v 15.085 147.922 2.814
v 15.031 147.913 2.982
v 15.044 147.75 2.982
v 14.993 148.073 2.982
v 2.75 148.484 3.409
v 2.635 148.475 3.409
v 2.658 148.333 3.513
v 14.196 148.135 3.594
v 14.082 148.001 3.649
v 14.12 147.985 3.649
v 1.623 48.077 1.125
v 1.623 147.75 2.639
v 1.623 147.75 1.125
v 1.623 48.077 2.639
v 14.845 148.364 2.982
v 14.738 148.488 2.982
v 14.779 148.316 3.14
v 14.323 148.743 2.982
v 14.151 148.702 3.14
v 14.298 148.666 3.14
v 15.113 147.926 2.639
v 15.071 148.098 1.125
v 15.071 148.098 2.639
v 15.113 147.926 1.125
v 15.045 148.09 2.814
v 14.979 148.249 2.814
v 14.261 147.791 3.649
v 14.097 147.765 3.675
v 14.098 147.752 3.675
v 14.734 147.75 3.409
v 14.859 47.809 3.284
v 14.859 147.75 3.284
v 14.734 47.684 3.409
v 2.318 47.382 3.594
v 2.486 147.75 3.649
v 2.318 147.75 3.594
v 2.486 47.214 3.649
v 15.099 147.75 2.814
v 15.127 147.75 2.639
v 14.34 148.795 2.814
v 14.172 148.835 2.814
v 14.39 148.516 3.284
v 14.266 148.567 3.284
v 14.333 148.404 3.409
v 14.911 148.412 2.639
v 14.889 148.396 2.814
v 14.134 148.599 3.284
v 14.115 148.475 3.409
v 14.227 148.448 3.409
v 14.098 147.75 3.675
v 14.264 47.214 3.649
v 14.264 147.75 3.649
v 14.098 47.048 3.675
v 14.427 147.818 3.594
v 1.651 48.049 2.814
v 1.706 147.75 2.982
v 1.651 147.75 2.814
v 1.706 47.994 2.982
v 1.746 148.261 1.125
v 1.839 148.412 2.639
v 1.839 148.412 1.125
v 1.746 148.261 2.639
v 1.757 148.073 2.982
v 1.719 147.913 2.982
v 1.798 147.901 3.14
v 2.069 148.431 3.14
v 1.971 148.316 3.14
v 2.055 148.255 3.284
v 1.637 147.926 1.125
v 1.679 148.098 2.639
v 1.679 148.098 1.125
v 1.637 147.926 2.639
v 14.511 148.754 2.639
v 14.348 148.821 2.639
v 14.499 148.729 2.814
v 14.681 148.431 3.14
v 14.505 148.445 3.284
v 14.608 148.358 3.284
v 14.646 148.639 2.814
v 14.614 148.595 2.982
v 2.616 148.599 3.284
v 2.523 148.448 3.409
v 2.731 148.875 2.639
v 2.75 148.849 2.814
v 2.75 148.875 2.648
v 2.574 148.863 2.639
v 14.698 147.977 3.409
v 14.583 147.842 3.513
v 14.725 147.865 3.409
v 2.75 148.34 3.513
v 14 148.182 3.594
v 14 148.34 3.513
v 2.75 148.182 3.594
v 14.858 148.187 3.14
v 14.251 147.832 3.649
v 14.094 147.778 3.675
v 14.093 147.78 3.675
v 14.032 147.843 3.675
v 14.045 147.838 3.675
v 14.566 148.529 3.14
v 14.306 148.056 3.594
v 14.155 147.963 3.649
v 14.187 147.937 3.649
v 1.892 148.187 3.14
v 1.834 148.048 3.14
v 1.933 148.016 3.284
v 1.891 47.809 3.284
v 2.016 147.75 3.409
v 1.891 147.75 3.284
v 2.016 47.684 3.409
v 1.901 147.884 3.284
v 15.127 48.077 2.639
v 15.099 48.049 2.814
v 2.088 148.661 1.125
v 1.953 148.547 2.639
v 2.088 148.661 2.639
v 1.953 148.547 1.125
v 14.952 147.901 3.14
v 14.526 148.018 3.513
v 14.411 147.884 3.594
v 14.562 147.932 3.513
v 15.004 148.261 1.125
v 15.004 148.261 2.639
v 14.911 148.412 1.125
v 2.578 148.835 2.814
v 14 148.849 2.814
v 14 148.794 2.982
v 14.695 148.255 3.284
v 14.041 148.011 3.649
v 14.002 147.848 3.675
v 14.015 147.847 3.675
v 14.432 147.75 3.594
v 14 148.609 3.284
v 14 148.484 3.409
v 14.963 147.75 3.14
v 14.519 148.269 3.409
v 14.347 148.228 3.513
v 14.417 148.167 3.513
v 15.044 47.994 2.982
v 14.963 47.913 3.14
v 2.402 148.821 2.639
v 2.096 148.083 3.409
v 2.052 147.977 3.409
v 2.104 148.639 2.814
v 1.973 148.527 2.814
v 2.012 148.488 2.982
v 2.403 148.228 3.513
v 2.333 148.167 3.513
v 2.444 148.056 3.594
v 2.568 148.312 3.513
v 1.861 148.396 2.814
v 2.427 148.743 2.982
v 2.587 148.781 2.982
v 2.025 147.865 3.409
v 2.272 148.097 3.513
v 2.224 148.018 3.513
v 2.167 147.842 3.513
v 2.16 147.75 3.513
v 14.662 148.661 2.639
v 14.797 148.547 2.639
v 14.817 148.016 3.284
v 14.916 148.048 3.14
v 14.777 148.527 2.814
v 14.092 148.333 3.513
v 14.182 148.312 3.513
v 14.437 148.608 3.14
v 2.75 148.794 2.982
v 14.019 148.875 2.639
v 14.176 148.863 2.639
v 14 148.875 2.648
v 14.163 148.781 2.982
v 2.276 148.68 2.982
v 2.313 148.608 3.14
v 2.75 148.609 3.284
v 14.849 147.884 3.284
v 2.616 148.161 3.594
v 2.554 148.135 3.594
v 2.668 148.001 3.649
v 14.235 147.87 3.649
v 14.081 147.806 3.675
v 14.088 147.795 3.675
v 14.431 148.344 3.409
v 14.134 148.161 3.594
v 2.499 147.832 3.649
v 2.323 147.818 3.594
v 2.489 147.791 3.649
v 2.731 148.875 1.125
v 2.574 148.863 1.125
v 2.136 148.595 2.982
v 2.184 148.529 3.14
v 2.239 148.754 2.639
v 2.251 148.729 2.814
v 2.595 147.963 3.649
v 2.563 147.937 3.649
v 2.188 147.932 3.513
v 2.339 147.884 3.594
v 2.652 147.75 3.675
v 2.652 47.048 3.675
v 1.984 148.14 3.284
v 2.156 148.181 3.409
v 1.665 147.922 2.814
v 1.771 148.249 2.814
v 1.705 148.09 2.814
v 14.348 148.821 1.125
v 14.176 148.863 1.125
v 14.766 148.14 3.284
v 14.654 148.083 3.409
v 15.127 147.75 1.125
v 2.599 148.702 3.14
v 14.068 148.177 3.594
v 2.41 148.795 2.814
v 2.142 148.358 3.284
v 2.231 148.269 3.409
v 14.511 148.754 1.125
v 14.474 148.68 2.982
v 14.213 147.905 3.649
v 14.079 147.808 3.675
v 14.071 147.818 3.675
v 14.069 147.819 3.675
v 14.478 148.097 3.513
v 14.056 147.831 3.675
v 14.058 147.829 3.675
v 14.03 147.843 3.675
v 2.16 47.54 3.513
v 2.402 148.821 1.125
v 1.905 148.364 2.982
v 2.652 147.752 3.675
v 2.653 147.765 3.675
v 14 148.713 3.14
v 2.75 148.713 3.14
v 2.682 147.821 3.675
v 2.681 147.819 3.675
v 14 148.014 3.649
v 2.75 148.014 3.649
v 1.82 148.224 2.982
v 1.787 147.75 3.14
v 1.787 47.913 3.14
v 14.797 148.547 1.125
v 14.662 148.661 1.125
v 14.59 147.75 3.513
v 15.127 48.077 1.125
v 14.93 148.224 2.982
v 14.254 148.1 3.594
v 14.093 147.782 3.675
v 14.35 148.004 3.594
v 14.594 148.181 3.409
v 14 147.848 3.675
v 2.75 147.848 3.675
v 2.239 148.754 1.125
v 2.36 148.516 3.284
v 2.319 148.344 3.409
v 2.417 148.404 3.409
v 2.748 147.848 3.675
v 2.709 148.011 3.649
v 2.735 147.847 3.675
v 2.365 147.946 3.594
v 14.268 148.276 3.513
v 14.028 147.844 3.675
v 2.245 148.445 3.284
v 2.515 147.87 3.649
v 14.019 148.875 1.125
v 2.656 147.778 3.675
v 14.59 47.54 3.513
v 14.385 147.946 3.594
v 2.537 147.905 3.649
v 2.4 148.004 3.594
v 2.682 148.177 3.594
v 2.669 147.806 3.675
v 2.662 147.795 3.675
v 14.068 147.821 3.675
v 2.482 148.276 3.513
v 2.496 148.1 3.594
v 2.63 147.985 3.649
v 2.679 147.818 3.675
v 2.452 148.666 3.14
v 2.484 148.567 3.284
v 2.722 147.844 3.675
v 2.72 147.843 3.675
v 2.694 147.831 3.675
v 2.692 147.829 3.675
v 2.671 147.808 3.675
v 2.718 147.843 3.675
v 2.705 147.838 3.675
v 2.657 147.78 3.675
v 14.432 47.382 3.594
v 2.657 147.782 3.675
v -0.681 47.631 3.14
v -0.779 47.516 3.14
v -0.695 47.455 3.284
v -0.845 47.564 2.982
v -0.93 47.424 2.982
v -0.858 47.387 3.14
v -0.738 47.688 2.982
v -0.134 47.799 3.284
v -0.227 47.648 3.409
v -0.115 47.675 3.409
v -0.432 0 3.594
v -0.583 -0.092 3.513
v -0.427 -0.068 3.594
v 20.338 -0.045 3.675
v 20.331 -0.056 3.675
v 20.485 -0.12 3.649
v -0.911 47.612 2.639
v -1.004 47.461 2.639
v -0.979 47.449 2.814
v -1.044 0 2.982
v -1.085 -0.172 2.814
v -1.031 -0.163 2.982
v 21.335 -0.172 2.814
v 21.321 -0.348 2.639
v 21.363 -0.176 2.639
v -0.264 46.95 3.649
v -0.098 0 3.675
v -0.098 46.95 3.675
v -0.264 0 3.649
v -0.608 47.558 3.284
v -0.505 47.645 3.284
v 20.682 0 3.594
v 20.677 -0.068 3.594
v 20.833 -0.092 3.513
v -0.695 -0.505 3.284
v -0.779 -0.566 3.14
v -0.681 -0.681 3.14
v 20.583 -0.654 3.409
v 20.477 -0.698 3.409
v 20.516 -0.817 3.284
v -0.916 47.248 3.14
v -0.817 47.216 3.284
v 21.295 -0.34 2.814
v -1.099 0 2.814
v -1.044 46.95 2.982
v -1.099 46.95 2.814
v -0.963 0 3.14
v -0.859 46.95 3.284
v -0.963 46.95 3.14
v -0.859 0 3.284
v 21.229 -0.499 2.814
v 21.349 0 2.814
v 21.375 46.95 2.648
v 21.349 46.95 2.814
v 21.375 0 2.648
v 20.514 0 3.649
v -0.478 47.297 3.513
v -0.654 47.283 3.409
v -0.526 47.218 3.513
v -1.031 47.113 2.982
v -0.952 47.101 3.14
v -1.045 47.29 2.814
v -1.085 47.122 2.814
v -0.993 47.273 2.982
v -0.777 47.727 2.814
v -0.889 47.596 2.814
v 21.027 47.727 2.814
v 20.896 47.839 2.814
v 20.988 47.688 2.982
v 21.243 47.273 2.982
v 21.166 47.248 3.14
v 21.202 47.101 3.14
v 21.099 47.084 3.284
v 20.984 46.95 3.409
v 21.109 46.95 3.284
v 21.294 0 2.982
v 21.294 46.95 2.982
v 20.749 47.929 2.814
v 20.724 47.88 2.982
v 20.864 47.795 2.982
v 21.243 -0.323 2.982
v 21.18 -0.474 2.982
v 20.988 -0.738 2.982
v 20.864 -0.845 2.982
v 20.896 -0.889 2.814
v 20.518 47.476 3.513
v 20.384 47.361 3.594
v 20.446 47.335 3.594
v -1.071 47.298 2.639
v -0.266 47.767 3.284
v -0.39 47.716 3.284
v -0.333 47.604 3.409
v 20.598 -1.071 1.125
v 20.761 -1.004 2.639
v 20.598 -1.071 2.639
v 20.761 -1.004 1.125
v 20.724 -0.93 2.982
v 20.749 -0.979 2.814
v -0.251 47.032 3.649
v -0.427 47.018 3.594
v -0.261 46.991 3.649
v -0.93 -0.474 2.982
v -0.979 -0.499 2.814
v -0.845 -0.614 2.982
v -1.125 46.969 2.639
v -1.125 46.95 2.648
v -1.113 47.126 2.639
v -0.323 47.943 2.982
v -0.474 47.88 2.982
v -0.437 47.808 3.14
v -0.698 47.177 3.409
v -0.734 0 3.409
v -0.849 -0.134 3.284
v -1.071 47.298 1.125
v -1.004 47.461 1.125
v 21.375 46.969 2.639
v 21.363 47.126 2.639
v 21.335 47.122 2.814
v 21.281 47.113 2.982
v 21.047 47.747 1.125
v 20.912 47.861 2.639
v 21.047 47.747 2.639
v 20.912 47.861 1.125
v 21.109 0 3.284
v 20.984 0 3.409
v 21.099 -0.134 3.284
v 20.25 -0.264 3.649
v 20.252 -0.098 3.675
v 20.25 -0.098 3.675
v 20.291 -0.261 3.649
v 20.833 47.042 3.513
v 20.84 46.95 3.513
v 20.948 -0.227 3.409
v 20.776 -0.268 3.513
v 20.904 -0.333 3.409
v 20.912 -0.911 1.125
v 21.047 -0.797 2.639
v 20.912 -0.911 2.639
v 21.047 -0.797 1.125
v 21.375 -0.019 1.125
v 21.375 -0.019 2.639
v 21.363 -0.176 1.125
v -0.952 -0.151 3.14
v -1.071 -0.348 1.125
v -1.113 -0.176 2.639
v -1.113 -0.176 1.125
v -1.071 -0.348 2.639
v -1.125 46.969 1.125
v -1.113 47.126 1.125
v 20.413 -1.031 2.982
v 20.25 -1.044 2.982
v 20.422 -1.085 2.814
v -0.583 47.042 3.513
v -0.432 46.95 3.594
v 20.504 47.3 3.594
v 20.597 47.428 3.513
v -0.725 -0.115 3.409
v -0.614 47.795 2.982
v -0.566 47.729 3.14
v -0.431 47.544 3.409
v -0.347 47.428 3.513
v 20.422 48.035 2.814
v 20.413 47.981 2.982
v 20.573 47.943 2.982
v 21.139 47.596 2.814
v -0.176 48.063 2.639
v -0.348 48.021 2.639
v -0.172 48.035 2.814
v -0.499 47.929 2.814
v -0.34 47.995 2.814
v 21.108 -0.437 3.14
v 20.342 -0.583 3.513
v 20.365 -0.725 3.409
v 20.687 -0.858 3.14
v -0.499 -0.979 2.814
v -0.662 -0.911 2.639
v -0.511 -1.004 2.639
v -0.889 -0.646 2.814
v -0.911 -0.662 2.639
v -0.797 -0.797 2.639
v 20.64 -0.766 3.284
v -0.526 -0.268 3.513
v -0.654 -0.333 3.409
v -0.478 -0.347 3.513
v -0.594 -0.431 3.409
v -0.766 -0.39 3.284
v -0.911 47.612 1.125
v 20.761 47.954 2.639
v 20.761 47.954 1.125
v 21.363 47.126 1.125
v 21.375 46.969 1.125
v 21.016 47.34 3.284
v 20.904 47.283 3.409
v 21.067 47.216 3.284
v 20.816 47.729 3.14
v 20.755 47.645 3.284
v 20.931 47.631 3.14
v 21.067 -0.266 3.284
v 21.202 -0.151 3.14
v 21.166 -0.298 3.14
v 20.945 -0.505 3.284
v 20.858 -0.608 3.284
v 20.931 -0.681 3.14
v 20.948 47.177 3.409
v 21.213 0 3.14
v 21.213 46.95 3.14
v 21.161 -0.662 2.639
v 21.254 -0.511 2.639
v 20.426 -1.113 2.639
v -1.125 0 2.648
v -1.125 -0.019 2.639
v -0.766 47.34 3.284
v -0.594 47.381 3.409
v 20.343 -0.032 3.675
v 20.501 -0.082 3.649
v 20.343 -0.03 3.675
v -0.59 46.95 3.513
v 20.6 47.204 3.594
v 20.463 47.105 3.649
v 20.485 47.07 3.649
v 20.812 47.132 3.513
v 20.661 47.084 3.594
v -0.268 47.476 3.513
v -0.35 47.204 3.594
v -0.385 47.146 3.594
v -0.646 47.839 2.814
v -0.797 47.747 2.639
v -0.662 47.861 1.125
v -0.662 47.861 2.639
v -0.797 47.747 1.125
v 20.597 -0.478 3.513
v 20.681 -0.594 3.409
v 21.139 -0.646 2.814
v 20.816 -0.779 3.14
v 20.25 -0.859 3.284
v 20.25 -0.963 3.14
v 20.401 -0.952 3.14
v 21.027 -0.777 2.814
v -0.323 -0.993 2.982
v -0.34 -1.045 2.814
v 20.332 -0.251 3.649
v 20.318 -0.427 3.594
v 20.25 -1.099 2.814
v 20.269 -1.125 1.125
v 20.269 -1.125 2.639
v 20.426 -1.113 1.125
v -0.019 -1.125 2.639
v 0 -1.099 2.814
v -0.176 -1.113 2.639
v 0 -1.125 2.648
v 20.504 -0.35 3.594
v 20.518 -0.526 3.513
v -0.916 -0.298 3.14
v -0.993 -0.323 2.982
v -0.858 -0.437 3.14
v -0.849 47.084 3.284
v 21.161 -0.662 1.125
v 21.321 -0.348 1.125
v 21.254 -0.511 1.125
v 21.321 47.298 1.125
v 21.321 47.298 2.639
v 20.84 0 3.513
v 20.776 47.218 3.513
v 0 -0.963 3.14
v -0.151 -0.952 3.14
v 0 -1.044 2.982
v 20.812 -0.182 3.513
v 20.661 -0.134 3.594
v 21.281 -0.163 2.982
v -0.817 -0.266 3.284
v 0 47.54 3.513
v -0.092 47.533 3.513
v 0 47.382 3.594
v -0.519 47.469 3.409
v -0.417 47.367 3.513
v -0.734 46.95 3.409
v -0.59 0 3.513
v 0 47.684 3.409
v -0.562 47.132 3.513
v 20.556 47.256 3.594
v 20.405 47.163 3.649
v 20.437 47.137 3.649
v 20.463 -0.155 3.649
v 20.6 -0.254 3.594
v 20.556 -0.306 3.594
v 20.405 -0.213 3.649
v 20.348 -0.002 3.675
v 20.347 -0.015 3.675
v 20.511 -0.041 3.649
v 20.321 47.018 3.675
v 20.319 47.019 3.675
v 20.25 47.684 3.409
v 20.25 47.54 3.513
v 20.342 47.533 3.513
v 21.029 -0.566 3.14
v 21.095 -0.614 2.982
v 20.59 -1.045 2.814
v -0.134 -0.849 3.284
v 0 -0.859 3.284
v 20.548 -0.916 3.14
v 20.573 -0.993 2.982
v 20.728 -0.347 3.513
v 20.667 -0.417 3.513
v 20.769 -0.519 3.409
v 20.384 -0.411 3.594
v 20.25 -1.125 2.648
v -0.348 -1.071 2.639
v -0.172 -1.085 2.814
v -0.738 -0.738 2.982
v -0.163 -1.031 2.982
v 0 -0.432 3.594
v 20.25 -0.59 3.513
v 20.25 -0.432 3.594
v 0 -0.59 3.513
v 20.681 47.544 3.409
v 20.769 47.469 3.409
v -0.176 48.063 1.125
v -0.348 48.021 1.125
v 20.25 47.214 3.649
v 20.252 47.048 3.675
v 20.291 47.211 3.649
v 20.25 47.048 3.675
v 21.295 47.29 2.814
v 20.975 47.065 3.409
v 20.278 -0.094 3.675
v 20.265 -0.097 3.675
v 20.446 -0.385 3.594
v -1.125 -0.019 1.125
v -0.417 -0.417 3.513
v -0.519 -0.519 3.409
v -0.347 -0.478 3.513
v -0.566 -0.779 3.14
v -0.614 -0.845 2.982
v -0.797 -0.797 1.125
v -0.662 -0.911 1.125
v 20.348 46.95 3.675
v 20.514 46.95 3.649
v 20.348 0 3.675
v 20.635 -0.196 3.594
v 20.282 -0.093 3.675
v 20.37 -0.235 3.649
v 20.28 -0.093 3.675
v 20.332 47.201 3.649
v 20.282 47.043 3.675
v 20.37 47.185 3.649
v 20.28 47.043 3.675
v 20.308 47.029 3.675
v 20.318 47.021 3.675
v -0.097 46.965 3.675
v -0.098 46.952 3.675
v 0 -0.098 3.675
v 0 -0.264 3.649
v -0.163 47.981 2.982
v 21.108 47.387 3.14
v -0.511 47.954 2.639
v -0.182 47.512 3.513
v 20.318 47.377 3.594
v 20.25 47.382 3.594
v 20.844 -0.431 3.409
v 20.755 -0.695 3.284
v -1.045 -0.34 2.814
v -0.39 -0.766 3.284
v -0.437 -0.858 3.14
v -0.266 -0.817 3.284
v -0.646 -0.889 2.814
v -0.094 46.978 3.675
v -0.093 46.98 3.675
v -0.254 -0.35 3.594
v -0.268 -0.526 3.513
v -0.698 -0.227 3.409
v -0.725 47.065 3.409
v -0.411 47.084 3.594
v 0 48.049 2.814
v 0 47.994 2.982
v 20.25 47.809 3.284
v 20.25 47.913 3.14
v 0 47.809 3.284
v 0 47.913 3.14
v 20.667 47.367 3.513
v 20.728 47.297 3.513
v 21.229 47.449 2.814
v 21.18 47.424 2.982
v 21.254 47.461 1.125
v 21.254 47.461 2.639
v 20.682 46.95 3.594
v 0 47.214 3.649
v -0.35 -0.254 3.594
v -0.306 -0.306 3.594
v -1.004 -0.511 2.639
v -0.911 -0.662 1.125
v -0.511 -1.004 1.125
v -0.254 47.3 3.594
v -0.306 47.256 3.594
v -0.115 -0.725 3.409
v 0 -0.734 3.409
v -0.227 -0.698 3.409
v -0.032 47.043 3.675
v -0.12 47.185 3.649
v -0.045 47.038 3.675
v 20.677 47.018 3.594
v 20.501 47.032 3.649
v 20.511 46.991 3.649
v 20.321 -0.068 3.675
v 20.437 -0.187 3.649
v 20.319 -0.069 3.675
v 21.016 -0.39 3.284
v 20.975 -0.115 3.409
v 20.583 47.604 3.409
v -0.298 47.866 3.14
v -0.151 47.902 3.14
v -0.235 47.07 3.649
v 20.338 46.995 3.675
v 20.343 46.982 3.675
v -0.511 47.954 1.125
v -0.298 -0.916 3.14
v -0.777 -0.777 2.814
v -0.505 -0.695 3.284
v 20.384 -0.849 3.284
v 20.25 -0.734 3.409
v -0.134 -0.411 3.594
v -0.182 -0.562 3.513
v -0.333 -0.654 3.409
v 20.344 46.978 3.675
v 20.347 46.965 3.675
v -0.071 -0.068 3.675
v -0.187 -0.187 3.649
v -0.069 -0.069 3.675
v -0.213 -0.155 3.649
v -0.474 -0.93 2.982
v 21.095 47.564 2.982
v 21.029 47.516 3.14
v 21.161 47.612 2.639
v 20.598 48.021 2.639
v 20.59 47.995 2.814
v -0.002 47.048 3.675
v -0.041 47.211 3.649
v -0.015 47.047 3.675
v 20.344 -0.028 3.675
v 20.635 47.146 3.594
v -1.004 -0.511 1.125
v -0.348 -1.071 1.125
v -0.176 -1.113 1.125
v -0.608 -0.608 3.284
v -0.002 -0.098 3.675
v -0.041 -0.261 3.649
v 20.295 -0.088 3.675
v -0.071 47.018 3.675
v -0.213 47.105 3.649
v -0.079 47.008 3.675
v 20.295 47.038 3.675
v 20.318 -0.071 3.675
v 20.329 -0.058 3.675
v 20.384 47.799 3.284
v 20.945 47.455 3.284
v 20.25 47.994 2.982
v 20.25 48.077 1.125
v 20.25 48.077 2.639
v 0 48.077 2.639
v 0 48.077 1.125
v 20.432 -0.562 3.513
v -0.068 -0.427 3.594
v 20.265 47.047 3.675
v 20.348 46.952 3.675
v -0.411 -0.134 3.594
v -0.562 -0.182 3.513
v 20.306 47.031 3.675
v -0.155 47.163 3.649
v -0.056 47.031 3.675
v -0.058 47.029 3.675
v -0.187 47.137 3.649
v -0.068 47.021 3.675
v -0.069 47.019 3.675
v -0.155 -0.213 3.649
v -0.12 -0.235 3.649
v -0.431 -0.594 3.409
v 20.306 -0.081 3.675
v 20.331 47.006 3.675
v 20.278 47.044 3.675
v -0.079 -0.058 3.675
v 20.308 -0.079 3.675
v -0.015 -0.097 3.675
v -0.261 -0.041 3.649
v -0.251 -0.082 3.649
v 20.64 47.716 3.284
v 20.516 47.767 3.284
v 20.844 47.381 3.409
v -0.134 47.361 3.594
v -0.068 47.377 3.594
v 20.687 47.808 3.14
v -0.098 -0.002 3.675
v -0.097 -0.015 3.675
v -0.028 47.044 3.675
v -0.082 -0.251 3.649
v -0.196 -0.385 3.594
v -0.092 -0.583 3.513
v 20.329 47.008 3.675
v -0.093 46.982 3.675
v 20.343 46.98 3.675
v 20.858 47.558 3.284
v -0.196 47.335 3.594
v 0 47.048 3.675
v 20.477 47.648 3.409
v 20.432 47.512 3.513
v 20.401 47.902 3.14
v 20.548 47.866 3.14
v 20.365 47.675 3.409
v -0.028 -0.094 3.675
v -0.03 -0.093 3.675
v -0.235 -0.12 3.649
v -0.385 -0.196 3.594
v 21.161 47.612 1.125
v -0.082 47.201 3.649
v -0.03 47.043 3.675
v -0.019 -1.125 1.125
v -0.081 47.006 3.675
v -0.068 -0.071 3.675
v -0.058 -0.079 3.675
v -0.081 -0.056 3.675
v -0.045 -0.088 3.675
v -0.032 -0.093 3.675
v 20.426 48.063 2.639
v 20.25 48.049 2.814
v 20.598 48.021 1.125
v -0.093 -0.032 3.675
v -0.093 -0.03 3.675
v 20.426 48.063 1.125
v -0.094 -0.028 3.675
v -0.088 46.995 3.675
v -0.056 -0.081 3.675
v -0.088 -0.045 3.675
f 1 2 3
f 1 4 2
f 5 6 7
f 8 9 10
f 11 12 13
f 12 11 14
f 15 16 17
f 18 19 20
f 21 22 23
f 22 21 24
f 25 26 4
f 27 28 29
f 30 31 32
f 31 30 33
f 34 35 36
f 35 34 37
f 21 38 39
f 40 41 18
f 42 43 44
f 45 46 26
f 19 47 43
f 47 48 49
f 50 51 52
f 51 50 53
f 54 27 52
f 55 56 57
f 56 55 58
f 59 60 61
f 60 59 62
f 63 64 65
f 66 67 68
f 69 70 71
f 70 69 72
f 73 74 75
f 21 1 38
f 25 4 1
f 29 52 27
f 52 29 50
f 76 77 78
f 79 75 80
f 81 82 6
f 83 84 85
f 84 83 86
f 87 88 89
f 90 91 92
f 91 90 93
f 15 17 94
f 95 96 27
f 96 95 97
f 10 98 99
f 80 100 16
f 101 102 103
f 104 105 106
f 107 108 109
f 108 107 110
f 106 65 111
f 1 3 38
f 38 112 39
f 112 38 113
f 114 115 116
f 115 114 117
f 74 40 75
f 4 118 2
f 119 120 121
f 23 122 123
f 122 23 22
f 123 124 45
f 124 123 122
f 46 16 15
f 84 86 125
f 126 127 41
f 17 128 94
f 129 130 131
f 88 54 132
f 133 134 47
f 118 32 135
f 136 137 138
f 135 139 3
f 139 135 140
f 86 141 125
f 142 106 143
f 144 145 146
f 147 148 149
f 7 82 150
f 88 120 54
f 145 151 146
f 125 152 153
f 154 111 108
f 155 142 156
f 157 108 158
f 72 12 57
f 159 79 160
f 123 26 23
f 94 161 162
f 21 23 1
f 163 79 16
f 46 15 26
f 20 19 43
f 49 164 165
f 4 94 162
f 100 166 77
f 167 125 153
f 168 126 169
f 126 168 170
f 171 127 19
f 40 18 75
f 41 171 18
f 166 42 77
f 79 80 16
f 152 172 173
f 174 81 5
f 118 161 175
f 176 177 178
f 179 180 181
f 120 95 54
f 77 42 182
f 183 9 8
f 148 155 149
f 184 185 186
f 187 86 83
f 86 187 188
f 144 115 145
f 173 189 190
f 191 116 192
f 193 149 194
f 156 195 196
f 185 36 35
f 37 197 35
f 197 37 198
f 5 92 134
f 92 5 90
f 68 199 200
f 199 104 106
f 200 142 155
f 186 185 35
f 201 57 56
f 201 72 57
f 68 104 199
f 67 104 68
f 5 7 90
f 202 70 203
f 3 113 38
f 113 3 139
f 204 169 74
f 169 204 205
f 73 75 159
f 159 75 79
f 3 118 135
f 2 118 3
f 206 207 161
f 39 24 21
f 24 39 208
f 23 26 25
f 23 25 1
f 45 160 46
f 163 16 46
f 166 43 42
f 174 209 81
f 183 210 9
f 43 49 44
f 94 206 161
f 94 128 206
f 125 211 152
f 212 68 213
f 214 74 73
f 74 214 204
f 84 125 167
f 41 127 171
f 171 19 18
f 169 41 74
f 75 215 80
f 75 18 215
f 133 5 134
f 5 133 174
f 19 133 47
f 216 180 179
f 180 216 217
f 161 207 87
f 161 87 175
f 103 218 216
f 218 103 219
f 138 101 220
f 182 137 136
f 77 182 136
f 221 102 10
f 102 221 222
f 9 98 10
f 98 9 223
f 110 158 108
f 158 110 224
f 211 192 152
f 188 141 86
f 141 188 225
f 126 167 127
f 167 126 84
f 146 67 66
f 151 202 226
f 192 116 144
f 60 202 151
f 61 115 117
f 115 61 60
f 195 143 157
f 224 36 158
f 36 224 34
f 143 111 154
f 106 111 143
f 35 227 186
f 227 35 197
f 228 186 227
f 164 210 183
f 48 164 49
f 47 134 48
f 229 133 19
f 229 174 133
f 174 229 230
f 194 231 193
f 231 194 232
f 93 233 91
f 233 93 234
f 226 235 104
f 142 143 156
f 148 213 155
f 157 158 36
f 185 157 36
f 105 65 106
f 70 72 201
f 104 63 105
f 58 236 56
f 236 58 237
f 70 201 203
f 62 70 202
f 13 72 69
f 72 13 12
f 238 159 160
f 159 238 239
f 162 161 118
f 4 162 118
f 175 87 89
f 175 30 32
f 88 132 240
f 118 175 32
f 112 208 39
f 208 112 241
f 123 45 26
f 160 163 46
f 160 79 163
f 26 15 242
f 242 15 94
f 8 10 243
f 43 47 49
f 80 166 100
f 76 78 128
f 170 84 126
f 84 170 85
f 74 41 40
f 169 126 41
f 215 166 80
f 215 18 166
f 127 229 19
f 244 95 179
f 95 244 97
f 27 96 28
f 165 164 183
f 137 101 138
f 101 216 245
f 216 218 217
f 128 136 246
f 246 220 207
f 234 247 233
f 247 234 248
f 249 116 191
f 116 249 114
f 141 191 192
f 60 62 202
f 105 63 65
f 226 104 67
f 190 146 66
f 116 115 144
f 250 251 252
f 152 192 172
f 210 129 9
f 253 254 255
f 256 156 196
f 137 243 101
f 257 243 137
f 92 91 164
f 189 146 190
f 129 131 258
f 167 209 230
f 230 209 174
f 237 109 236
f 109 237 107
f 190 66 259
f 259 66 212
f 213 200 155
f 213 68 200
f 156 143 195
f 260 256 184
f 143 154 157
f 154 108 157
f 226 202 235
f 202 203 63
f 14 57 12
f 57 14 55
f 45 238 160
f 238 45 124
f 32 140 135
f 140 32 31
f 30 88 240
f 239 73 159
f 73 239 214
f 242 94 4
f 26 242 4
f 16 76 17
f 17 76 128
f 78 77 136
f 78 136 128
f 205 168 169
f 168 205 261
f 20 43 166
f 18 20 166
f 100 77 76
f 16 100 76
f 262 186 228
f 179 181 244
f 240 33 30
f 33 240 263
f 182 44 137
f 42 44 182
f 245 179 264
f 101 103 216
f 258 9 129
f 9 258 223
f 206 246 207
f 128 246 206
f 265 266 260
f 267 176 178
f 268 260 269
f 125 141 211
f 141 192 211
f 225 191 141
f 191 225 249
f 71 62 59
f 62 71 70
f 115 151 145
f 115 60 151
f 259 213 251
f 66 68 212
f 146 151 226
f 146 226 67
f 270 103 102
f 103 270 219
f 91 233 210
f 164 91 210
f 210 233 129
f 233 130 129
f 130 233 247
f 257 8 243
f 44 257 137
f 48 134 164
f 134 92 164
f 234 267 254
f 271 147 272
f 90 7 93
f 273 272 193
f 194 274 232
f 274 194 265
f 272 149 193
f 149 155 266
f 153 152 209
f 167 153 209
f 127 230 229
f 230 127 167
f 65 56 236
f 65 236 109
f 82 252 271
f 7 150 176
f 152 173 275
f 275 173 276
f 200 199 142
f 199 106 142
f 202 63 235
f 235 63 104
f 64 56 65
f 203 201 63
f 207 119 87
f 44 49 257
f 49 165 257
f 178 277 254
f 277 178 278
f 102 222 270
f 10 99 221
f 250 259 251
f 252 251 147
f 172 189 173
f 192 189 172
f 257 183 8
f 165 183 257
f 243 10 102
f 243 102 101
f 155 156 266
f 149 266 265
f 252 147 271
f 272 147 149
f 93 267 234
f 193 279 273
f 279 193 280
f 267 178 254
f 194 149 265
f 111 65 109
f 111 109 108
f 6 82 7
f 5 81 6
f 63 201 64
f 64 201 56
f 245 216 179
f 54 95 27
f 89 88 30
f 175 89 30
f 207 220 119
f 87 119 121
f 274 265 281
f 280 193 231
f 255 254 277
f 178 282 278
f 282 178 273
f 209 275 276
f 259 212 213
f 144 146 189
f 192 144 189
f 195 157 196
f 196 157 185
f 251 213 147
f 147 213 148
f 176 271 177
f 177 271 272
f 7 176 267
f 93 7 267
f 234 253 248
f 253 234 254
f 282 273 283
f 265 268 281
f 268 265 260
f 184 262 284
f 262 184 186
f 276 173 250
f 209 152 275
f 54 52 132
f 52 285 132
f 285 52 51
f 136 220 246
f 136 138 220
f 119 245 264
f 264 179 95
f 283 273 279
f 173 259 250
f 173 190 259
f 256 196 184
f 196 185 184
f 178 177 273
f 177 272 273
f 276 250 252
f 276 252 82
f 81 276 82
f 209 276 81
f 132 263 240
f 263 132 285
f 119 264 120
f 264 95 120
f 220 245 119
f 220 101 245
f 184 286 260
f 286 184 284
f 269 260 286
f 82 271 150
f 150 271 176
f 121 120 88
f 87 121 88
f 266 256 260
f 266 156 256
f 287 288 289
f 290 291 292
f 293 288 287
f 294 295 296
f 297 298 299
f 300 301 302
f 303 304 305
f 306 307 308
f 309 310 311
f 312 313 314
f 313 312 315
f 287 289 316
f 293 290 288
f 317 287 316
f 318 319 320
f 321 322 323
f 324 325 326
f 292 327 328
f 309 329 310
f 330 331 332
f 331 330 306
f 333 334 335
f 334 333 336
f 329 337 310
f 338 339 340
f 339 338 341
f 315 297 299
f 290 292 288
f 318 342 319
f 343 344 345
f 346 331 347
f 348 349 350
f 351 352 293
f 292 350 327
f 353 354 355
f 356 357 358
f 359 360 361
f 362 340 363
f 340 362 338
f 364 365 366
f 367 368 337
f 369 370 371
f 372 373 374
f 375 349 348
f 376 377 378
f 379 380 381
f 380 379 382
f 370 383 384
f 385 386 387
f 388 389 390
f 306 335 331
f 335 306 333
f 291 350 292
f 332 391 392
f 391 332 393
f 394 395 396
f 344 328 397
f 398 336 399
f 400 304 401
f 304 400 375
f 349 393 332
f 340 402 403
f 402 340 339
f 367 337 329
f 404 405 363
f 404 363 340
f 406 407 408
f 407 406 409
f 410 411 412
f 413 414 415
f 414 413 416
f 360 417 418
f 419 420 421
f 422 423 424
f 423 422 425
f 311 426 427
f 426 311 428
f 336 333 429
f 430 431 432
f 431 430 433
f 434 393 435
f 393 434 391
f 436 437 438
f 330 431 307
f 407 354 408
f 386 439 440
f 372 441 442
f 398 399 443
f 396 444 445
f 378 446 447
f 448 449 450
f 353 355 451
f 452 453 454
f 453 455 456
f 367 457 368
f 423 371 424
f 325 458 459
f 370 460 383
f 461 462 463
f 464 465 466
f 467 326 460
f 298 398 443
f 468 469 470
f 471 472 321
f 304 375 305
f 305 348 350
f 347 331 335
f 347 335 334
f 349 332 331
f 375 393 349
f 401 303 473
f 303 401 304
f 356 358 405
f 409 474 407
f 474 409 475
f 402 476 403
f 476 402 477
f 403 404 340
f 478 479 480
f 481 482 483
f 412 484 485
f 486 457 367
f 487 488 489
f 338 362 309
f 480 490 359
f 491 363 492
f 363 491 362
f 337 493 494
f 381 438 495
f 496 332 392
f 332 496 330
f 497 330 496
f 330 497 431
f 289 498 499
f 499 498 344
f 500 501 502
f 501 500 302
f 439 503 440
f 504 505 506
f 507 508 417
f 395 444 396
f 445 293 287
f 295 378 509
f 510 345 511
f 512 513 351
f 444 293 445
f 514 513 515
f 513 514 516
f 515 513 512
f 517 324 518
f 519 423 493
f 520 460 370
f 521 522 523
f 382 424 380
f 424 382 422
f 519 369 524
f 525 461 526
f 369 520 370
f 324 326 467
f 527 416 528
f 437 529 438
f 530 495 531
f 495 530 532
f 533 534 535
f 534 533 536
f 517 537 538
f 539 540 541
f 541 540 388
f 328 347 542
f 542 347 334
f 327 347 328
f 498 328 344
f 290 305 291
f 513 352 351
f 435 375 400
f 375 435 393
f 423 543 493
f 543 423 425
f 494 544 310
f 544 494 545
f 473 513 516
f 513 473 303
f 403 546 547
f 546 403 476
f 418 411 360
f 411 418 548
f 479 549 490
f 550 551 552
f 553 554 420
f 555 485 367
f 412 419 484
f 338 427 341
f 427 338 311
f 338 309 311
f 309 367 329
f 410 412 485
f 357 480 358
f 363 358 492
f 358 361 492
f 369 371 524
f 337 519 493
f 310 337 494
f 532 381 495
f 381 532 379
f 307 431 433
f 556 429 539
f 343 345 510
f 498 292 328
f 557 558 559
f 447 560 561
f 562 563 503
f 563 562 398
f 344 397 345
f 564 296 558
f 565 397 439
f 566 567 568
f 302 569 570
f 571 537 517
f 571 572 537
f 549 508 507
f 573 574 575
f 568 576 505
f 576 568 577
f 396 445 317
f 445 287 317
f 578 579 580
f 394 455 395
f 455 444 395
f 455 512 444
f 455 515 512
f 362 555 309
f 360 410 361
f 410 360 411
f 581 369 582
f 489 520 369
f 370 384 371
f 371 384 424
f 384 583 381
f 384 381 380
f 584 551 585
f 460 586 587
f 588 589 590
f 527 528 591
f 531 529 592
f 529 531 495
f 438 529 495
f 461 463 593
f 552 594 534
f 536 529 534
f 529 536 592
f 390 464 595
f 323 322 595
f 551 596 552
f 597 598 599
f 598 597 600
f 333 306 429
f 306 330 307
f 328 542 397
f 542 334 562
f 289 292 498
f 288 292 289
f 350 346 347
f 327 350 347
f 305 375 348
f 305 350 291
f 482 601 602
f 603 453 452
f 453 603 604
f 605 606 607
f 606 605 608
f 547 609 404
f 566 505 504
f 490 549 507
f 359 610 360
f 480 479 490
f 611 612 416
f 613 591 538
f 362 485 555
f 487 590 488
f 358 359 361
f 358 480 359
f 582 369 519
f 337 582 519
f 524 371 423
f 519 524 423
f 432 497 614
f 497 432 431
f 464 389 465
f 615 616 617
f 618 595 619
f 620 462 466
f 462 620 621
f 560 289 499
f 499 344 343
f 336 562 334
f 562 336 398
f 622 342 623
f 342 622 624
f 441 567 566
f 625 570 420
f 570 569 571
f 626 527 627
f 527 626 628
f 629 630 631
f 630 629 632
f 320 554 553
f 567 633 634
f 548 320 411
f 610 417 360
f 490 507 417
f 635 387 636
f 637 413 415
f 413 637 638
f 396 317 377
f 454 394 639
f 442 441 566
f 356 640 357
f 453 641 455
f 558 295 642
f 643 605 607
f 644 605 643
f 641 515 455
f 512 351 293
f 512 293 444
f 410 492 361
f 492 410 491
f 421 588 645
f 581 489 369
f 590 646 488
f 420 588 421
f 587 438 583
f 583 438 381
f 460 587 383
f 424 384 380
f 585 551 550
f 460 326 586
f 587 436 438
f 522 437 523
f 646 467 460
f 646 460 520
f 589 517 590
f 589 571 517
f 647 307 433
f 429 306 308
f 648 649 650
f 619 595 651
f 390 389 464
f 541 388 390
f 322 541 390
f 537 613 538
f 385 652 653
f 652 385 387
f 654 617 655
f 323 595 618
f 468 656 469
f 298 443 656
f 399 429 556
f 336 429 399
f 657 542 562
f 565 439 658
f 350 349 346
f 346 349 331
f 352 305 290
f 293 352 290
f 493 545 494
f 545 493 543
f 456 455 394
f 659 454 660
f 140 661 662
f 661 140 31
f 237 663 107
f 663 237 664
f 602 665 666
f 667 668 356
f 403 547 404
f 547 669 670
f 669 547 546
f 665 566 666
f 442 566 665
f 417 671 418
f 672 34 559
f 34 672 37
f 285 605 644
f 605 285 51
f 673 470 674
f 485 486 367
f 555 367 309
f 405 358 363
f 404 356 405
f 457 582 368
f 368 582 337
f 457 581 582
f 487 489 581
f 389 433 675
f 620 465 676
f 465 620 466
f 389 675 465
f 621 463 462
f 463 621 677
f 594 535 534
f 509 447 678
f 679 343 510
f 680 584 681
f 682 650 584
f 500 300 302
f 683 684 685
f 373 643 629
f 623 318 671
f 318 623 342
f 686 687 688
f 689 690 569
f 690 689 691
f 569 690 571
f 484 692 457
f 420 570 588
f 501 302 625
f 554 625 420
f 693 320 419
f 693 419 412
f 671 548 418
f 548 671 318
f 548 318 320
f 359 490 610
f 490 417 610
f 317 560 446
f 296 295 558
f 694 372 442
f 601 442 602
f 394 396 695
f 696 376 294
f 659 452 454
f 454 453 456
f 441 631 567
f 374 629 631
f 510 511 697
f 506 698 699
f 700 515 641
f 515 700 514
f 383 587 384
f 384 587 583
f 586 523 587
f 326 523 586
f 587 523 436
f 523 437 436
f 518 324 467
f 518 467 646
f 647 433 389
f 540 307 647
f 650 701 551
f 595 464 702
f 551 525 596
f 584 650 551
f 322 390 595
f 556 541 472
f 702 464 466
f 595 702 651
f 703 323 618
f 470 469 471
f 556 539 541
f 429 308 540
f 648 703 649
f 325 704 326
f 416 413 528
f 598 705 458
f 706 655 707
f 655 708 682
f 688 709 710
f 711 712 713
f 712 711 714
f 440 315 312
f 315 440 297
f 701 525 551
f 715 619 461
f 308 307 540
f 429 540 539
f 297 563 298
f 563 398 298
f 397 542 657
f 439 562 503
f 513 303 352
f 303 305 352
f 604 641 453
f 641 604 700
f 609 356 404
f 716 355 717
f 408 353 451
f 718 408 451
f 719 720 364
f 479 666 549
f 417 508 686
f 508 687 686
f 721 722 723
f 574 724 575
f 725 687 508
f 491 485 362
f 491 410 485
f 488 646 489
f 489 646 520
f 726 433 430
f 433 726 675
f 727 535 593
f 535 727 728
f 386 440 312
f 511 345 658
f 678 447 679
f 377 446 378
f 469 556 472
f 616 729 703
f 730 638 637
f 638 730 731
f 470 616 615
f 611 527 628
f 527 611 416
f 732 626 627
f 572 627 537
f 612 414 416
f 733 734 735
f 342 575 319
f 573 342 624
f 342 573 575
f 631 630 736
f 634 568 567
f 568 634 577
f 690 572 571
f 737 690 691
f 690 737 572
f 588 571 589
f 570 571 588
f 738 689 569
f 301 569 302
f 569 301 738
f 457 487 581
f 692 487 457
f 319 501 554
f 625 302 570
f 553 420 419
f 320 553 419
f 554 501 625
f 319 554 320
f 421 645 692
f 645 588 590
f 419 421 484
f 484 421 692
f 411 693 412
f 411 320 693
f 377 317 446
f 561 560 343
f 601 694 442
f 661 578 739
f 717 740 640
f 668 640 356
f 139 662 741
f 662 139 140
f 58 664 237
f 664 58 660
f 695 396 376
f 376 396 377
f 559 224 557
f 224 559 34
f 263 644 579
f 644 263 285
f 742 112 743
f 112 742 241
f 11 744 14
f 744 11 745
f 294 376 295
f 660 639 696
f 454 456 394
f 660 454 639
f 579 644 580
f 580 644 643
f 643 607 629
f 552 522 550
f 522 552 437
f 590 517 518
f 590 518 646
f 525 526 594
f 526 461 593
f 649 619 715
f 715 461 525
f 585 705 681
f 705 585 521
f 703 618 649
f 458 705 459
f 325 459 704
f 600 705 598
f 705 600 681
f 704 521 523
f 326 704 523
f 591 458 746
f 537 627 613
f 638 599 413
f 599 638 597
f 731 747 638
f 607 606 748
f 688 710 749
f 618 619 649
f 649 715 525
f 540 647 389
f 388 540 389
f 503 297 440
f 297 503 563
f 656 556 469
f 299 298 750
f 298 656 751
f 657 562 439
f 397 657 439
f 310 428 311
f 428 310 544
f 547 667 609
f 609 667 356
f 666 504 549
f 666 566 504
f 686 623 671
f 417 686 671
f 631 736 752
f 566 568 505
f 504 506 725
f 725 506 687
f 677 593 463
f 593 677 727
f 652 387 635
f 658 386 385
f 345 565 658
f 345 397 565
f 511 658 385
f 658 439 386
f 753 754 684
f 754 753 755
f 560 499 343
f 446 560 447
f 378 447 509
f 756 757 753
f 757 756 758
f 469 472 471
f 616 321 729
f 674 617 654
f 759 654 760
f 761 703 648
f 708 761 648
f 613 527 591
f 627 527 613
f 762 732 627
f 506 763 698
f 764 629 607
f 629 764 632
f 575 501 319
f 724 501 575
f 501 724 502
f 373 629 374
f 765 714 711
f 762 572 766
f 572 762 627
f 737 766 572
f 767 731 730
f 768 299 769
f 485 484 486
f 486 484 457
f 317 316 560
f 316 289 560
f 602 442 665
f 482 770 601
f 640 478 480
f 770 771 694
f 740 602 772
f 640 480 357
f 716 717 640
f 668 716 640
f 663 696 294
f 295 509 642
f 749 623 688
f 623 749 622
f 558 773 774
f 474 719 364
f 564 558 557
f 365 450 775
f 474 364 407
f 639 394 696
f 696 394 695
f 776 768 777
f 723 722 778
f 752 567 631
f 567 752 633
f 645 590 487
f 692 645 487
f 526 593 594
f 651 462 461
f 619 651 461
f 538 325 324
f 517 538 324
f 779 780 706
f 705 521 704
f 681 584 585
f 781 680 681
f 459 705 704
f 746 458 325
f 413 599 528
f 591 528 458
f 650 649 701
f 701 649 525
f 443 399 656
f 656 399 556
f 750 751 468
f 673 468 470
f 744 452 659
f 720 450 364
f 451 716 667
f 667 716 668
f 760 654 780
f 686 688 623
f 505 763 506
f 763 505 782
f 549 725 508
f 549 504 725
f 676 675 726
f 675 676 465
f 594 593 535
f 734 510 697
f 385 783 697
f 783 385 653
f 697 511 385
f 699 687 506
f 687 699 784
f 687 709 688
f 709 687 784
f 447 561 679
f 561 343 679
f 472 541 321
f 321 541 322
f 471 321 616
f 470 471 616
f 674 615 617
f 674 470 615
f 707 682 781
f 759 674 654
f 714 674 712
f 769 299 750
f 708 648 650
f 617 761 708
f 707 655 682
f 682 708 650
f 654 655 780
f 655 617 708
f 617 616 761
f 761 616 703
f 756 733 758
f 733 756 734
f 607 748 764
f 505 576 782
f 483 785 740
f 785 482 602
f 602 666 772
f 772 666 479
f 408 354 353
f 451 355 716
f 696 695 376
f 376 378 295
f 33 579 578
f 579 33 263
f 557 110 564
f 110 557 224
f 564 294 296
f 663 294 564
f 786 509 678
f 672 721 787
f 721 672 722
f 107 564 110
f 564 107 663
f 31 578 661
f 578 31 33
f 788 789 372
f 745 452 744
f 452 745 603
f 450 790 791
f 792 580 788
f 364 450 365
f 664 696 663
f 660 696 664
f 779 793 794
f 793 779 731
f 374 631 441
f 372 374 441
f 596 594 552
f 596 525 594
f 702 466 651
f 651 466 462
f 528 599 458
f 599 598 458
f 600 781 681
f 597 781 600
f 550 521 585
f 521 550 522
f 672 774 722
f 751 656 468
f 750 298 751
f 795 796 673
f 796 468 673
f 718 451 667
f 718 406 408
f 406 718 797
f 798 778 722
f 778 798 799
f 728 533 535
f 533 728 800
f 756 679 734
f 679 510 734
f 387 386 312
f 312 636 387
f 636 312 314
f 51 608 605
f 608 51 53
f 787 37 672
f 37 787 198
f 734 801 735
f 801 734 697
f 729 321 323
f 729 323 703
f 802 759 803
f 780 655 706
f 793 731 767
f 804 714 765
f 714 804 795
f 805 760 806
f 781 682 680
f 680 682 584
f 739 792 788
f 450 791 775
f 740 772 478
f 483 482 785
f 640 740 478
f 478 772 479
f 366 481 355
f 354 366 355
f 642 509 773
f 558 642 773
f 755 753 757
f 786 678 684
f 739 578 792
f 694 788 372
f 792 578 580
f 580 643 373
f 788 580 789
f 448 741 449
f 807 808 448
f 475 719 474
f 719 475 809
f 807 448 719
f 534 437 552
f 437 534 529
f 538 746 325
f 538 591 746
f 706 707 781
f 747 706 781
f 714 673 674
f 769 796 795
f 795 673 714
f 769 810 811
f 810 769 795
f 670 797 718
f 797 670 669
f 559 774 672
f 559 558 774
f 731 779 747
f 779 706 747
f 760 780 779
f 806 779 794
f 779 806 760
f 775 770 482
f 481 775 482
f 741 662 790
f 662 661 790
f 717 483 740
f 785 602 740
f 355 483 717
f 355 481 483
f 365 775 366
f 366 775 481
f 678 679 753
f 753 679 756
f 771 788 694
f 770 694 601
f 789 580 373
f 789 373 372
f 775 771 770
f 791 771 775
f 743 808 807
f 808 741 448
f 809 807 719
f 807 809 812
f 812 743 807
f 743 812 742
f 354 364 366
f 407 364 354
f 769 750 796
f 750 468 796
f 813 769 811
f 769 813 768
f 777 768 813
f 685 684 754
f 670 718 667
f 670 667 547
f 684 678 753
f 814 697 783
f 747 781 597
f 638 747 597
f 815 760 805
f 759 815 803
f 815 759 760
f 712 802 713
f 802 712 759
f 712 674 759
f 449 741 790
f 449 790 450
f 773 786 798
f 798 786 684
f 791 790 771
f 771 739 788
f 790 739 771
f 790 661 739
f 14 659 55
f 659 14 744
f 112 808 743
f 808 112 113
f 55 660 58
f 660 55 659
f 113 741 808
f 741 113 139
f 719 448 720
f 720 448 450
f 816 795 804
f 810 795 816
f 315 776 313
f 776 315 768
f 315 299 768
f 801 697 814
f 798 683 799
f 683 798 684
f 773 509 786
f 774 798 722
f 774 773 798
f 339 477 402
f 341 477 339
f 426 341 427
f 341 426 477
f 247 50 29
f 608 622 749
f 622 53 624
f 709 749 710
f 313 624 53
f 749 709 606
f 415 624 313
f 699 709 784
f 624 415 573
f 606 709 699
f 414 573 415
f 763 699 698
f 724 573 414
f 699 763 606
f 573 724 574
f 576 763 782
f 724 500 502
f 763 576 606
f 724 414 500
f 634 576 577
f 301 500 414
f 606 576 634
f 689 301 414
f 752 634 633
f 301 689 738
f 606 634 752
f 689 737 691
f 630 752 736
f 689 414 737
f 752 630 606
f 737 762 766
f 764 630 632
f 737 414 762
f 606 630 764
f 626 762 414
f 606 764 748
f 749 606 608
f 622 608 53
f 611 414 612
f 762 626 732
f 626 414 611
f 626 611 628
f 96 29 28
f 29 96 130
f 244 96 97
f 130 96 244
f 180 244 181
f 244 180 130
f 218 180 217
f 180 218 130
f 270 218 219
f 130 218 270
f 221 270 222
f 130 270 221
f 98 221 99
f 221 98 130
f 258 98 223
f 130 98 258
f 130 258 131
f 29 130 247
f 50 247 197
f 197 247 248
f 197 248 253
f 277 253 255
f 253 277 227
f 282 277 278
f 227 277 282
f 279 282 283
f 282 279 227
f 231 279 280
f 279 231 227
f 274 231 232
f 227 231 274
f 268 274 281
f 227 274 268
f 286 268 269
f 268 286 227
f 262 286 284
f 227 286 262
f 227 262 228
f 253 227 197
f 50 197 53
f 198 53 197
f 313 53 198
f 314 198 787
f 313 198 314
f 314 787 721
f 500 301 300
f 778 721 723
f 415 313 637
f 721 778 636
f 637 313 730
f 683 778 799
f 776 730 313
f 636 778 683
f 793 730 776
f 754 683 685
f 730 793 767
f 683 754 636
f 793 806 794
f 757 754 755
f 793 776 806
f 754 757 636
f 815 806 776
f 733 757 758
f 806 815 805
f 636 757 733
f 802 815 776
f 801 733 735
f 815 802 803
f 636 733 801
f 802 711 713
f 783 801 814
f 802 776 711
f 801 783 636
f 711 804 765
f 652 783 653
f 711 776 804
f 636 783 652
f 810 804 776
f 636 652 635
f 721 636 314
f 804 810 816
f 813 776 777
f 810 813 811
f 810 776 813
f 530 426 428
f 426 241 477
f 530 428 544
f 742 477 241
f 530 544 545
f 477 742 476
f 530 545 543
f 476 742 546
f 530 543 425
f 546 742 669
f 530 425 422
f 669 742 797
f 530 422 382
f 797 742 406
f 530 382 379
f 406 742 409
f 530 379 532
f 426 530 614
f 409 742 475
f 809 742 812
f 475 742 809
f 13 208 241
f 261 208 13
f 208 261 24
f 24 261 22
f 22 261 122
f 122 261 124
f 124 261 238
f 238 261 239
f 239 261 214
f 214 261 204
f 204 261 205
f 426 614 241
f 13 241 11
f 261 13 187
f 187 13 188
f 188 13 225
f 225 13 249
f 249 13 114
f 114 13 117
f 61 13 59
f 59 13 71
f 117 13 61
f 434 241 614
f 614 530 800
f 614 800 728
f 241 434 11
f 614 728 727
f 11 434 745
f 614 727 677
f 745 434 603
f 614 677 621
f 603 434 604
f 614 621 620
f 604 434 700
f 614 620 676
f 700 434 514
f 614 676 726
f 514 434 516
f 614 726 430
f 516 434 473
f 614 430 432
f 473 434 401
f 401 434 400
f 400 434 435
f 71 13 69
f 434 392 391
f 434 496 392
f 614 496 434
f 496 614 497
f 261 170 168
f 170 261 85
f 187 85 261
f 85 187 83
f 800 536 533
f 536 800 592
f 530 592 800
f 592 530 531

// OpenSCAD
head_width = 22.5;
head_length = 49.2;
tail_left = 2.75;
tail_right = 6.25;
entire_length = 150;
height = 2.55;
edge_radius = 1.125;

intersection()
{
  minkowski()
  {
    union()
    {
      translate([tail_left, 0, 0])
      cube([head_width - tail_left - tail_right - 2 * edge_radius, entire_length - 2 * edge_radius, height]);
      cube([head_width - 2 * edge_radius, head_length - 2 * edge_radius, height]);
    }
    
    sphere(edge_radius + 0.005, $fn = 40);
  }
  
  translate([-edge_radius, -edge_radius, edge_radius])
  cube([head_width, entire_length, height]);
}
